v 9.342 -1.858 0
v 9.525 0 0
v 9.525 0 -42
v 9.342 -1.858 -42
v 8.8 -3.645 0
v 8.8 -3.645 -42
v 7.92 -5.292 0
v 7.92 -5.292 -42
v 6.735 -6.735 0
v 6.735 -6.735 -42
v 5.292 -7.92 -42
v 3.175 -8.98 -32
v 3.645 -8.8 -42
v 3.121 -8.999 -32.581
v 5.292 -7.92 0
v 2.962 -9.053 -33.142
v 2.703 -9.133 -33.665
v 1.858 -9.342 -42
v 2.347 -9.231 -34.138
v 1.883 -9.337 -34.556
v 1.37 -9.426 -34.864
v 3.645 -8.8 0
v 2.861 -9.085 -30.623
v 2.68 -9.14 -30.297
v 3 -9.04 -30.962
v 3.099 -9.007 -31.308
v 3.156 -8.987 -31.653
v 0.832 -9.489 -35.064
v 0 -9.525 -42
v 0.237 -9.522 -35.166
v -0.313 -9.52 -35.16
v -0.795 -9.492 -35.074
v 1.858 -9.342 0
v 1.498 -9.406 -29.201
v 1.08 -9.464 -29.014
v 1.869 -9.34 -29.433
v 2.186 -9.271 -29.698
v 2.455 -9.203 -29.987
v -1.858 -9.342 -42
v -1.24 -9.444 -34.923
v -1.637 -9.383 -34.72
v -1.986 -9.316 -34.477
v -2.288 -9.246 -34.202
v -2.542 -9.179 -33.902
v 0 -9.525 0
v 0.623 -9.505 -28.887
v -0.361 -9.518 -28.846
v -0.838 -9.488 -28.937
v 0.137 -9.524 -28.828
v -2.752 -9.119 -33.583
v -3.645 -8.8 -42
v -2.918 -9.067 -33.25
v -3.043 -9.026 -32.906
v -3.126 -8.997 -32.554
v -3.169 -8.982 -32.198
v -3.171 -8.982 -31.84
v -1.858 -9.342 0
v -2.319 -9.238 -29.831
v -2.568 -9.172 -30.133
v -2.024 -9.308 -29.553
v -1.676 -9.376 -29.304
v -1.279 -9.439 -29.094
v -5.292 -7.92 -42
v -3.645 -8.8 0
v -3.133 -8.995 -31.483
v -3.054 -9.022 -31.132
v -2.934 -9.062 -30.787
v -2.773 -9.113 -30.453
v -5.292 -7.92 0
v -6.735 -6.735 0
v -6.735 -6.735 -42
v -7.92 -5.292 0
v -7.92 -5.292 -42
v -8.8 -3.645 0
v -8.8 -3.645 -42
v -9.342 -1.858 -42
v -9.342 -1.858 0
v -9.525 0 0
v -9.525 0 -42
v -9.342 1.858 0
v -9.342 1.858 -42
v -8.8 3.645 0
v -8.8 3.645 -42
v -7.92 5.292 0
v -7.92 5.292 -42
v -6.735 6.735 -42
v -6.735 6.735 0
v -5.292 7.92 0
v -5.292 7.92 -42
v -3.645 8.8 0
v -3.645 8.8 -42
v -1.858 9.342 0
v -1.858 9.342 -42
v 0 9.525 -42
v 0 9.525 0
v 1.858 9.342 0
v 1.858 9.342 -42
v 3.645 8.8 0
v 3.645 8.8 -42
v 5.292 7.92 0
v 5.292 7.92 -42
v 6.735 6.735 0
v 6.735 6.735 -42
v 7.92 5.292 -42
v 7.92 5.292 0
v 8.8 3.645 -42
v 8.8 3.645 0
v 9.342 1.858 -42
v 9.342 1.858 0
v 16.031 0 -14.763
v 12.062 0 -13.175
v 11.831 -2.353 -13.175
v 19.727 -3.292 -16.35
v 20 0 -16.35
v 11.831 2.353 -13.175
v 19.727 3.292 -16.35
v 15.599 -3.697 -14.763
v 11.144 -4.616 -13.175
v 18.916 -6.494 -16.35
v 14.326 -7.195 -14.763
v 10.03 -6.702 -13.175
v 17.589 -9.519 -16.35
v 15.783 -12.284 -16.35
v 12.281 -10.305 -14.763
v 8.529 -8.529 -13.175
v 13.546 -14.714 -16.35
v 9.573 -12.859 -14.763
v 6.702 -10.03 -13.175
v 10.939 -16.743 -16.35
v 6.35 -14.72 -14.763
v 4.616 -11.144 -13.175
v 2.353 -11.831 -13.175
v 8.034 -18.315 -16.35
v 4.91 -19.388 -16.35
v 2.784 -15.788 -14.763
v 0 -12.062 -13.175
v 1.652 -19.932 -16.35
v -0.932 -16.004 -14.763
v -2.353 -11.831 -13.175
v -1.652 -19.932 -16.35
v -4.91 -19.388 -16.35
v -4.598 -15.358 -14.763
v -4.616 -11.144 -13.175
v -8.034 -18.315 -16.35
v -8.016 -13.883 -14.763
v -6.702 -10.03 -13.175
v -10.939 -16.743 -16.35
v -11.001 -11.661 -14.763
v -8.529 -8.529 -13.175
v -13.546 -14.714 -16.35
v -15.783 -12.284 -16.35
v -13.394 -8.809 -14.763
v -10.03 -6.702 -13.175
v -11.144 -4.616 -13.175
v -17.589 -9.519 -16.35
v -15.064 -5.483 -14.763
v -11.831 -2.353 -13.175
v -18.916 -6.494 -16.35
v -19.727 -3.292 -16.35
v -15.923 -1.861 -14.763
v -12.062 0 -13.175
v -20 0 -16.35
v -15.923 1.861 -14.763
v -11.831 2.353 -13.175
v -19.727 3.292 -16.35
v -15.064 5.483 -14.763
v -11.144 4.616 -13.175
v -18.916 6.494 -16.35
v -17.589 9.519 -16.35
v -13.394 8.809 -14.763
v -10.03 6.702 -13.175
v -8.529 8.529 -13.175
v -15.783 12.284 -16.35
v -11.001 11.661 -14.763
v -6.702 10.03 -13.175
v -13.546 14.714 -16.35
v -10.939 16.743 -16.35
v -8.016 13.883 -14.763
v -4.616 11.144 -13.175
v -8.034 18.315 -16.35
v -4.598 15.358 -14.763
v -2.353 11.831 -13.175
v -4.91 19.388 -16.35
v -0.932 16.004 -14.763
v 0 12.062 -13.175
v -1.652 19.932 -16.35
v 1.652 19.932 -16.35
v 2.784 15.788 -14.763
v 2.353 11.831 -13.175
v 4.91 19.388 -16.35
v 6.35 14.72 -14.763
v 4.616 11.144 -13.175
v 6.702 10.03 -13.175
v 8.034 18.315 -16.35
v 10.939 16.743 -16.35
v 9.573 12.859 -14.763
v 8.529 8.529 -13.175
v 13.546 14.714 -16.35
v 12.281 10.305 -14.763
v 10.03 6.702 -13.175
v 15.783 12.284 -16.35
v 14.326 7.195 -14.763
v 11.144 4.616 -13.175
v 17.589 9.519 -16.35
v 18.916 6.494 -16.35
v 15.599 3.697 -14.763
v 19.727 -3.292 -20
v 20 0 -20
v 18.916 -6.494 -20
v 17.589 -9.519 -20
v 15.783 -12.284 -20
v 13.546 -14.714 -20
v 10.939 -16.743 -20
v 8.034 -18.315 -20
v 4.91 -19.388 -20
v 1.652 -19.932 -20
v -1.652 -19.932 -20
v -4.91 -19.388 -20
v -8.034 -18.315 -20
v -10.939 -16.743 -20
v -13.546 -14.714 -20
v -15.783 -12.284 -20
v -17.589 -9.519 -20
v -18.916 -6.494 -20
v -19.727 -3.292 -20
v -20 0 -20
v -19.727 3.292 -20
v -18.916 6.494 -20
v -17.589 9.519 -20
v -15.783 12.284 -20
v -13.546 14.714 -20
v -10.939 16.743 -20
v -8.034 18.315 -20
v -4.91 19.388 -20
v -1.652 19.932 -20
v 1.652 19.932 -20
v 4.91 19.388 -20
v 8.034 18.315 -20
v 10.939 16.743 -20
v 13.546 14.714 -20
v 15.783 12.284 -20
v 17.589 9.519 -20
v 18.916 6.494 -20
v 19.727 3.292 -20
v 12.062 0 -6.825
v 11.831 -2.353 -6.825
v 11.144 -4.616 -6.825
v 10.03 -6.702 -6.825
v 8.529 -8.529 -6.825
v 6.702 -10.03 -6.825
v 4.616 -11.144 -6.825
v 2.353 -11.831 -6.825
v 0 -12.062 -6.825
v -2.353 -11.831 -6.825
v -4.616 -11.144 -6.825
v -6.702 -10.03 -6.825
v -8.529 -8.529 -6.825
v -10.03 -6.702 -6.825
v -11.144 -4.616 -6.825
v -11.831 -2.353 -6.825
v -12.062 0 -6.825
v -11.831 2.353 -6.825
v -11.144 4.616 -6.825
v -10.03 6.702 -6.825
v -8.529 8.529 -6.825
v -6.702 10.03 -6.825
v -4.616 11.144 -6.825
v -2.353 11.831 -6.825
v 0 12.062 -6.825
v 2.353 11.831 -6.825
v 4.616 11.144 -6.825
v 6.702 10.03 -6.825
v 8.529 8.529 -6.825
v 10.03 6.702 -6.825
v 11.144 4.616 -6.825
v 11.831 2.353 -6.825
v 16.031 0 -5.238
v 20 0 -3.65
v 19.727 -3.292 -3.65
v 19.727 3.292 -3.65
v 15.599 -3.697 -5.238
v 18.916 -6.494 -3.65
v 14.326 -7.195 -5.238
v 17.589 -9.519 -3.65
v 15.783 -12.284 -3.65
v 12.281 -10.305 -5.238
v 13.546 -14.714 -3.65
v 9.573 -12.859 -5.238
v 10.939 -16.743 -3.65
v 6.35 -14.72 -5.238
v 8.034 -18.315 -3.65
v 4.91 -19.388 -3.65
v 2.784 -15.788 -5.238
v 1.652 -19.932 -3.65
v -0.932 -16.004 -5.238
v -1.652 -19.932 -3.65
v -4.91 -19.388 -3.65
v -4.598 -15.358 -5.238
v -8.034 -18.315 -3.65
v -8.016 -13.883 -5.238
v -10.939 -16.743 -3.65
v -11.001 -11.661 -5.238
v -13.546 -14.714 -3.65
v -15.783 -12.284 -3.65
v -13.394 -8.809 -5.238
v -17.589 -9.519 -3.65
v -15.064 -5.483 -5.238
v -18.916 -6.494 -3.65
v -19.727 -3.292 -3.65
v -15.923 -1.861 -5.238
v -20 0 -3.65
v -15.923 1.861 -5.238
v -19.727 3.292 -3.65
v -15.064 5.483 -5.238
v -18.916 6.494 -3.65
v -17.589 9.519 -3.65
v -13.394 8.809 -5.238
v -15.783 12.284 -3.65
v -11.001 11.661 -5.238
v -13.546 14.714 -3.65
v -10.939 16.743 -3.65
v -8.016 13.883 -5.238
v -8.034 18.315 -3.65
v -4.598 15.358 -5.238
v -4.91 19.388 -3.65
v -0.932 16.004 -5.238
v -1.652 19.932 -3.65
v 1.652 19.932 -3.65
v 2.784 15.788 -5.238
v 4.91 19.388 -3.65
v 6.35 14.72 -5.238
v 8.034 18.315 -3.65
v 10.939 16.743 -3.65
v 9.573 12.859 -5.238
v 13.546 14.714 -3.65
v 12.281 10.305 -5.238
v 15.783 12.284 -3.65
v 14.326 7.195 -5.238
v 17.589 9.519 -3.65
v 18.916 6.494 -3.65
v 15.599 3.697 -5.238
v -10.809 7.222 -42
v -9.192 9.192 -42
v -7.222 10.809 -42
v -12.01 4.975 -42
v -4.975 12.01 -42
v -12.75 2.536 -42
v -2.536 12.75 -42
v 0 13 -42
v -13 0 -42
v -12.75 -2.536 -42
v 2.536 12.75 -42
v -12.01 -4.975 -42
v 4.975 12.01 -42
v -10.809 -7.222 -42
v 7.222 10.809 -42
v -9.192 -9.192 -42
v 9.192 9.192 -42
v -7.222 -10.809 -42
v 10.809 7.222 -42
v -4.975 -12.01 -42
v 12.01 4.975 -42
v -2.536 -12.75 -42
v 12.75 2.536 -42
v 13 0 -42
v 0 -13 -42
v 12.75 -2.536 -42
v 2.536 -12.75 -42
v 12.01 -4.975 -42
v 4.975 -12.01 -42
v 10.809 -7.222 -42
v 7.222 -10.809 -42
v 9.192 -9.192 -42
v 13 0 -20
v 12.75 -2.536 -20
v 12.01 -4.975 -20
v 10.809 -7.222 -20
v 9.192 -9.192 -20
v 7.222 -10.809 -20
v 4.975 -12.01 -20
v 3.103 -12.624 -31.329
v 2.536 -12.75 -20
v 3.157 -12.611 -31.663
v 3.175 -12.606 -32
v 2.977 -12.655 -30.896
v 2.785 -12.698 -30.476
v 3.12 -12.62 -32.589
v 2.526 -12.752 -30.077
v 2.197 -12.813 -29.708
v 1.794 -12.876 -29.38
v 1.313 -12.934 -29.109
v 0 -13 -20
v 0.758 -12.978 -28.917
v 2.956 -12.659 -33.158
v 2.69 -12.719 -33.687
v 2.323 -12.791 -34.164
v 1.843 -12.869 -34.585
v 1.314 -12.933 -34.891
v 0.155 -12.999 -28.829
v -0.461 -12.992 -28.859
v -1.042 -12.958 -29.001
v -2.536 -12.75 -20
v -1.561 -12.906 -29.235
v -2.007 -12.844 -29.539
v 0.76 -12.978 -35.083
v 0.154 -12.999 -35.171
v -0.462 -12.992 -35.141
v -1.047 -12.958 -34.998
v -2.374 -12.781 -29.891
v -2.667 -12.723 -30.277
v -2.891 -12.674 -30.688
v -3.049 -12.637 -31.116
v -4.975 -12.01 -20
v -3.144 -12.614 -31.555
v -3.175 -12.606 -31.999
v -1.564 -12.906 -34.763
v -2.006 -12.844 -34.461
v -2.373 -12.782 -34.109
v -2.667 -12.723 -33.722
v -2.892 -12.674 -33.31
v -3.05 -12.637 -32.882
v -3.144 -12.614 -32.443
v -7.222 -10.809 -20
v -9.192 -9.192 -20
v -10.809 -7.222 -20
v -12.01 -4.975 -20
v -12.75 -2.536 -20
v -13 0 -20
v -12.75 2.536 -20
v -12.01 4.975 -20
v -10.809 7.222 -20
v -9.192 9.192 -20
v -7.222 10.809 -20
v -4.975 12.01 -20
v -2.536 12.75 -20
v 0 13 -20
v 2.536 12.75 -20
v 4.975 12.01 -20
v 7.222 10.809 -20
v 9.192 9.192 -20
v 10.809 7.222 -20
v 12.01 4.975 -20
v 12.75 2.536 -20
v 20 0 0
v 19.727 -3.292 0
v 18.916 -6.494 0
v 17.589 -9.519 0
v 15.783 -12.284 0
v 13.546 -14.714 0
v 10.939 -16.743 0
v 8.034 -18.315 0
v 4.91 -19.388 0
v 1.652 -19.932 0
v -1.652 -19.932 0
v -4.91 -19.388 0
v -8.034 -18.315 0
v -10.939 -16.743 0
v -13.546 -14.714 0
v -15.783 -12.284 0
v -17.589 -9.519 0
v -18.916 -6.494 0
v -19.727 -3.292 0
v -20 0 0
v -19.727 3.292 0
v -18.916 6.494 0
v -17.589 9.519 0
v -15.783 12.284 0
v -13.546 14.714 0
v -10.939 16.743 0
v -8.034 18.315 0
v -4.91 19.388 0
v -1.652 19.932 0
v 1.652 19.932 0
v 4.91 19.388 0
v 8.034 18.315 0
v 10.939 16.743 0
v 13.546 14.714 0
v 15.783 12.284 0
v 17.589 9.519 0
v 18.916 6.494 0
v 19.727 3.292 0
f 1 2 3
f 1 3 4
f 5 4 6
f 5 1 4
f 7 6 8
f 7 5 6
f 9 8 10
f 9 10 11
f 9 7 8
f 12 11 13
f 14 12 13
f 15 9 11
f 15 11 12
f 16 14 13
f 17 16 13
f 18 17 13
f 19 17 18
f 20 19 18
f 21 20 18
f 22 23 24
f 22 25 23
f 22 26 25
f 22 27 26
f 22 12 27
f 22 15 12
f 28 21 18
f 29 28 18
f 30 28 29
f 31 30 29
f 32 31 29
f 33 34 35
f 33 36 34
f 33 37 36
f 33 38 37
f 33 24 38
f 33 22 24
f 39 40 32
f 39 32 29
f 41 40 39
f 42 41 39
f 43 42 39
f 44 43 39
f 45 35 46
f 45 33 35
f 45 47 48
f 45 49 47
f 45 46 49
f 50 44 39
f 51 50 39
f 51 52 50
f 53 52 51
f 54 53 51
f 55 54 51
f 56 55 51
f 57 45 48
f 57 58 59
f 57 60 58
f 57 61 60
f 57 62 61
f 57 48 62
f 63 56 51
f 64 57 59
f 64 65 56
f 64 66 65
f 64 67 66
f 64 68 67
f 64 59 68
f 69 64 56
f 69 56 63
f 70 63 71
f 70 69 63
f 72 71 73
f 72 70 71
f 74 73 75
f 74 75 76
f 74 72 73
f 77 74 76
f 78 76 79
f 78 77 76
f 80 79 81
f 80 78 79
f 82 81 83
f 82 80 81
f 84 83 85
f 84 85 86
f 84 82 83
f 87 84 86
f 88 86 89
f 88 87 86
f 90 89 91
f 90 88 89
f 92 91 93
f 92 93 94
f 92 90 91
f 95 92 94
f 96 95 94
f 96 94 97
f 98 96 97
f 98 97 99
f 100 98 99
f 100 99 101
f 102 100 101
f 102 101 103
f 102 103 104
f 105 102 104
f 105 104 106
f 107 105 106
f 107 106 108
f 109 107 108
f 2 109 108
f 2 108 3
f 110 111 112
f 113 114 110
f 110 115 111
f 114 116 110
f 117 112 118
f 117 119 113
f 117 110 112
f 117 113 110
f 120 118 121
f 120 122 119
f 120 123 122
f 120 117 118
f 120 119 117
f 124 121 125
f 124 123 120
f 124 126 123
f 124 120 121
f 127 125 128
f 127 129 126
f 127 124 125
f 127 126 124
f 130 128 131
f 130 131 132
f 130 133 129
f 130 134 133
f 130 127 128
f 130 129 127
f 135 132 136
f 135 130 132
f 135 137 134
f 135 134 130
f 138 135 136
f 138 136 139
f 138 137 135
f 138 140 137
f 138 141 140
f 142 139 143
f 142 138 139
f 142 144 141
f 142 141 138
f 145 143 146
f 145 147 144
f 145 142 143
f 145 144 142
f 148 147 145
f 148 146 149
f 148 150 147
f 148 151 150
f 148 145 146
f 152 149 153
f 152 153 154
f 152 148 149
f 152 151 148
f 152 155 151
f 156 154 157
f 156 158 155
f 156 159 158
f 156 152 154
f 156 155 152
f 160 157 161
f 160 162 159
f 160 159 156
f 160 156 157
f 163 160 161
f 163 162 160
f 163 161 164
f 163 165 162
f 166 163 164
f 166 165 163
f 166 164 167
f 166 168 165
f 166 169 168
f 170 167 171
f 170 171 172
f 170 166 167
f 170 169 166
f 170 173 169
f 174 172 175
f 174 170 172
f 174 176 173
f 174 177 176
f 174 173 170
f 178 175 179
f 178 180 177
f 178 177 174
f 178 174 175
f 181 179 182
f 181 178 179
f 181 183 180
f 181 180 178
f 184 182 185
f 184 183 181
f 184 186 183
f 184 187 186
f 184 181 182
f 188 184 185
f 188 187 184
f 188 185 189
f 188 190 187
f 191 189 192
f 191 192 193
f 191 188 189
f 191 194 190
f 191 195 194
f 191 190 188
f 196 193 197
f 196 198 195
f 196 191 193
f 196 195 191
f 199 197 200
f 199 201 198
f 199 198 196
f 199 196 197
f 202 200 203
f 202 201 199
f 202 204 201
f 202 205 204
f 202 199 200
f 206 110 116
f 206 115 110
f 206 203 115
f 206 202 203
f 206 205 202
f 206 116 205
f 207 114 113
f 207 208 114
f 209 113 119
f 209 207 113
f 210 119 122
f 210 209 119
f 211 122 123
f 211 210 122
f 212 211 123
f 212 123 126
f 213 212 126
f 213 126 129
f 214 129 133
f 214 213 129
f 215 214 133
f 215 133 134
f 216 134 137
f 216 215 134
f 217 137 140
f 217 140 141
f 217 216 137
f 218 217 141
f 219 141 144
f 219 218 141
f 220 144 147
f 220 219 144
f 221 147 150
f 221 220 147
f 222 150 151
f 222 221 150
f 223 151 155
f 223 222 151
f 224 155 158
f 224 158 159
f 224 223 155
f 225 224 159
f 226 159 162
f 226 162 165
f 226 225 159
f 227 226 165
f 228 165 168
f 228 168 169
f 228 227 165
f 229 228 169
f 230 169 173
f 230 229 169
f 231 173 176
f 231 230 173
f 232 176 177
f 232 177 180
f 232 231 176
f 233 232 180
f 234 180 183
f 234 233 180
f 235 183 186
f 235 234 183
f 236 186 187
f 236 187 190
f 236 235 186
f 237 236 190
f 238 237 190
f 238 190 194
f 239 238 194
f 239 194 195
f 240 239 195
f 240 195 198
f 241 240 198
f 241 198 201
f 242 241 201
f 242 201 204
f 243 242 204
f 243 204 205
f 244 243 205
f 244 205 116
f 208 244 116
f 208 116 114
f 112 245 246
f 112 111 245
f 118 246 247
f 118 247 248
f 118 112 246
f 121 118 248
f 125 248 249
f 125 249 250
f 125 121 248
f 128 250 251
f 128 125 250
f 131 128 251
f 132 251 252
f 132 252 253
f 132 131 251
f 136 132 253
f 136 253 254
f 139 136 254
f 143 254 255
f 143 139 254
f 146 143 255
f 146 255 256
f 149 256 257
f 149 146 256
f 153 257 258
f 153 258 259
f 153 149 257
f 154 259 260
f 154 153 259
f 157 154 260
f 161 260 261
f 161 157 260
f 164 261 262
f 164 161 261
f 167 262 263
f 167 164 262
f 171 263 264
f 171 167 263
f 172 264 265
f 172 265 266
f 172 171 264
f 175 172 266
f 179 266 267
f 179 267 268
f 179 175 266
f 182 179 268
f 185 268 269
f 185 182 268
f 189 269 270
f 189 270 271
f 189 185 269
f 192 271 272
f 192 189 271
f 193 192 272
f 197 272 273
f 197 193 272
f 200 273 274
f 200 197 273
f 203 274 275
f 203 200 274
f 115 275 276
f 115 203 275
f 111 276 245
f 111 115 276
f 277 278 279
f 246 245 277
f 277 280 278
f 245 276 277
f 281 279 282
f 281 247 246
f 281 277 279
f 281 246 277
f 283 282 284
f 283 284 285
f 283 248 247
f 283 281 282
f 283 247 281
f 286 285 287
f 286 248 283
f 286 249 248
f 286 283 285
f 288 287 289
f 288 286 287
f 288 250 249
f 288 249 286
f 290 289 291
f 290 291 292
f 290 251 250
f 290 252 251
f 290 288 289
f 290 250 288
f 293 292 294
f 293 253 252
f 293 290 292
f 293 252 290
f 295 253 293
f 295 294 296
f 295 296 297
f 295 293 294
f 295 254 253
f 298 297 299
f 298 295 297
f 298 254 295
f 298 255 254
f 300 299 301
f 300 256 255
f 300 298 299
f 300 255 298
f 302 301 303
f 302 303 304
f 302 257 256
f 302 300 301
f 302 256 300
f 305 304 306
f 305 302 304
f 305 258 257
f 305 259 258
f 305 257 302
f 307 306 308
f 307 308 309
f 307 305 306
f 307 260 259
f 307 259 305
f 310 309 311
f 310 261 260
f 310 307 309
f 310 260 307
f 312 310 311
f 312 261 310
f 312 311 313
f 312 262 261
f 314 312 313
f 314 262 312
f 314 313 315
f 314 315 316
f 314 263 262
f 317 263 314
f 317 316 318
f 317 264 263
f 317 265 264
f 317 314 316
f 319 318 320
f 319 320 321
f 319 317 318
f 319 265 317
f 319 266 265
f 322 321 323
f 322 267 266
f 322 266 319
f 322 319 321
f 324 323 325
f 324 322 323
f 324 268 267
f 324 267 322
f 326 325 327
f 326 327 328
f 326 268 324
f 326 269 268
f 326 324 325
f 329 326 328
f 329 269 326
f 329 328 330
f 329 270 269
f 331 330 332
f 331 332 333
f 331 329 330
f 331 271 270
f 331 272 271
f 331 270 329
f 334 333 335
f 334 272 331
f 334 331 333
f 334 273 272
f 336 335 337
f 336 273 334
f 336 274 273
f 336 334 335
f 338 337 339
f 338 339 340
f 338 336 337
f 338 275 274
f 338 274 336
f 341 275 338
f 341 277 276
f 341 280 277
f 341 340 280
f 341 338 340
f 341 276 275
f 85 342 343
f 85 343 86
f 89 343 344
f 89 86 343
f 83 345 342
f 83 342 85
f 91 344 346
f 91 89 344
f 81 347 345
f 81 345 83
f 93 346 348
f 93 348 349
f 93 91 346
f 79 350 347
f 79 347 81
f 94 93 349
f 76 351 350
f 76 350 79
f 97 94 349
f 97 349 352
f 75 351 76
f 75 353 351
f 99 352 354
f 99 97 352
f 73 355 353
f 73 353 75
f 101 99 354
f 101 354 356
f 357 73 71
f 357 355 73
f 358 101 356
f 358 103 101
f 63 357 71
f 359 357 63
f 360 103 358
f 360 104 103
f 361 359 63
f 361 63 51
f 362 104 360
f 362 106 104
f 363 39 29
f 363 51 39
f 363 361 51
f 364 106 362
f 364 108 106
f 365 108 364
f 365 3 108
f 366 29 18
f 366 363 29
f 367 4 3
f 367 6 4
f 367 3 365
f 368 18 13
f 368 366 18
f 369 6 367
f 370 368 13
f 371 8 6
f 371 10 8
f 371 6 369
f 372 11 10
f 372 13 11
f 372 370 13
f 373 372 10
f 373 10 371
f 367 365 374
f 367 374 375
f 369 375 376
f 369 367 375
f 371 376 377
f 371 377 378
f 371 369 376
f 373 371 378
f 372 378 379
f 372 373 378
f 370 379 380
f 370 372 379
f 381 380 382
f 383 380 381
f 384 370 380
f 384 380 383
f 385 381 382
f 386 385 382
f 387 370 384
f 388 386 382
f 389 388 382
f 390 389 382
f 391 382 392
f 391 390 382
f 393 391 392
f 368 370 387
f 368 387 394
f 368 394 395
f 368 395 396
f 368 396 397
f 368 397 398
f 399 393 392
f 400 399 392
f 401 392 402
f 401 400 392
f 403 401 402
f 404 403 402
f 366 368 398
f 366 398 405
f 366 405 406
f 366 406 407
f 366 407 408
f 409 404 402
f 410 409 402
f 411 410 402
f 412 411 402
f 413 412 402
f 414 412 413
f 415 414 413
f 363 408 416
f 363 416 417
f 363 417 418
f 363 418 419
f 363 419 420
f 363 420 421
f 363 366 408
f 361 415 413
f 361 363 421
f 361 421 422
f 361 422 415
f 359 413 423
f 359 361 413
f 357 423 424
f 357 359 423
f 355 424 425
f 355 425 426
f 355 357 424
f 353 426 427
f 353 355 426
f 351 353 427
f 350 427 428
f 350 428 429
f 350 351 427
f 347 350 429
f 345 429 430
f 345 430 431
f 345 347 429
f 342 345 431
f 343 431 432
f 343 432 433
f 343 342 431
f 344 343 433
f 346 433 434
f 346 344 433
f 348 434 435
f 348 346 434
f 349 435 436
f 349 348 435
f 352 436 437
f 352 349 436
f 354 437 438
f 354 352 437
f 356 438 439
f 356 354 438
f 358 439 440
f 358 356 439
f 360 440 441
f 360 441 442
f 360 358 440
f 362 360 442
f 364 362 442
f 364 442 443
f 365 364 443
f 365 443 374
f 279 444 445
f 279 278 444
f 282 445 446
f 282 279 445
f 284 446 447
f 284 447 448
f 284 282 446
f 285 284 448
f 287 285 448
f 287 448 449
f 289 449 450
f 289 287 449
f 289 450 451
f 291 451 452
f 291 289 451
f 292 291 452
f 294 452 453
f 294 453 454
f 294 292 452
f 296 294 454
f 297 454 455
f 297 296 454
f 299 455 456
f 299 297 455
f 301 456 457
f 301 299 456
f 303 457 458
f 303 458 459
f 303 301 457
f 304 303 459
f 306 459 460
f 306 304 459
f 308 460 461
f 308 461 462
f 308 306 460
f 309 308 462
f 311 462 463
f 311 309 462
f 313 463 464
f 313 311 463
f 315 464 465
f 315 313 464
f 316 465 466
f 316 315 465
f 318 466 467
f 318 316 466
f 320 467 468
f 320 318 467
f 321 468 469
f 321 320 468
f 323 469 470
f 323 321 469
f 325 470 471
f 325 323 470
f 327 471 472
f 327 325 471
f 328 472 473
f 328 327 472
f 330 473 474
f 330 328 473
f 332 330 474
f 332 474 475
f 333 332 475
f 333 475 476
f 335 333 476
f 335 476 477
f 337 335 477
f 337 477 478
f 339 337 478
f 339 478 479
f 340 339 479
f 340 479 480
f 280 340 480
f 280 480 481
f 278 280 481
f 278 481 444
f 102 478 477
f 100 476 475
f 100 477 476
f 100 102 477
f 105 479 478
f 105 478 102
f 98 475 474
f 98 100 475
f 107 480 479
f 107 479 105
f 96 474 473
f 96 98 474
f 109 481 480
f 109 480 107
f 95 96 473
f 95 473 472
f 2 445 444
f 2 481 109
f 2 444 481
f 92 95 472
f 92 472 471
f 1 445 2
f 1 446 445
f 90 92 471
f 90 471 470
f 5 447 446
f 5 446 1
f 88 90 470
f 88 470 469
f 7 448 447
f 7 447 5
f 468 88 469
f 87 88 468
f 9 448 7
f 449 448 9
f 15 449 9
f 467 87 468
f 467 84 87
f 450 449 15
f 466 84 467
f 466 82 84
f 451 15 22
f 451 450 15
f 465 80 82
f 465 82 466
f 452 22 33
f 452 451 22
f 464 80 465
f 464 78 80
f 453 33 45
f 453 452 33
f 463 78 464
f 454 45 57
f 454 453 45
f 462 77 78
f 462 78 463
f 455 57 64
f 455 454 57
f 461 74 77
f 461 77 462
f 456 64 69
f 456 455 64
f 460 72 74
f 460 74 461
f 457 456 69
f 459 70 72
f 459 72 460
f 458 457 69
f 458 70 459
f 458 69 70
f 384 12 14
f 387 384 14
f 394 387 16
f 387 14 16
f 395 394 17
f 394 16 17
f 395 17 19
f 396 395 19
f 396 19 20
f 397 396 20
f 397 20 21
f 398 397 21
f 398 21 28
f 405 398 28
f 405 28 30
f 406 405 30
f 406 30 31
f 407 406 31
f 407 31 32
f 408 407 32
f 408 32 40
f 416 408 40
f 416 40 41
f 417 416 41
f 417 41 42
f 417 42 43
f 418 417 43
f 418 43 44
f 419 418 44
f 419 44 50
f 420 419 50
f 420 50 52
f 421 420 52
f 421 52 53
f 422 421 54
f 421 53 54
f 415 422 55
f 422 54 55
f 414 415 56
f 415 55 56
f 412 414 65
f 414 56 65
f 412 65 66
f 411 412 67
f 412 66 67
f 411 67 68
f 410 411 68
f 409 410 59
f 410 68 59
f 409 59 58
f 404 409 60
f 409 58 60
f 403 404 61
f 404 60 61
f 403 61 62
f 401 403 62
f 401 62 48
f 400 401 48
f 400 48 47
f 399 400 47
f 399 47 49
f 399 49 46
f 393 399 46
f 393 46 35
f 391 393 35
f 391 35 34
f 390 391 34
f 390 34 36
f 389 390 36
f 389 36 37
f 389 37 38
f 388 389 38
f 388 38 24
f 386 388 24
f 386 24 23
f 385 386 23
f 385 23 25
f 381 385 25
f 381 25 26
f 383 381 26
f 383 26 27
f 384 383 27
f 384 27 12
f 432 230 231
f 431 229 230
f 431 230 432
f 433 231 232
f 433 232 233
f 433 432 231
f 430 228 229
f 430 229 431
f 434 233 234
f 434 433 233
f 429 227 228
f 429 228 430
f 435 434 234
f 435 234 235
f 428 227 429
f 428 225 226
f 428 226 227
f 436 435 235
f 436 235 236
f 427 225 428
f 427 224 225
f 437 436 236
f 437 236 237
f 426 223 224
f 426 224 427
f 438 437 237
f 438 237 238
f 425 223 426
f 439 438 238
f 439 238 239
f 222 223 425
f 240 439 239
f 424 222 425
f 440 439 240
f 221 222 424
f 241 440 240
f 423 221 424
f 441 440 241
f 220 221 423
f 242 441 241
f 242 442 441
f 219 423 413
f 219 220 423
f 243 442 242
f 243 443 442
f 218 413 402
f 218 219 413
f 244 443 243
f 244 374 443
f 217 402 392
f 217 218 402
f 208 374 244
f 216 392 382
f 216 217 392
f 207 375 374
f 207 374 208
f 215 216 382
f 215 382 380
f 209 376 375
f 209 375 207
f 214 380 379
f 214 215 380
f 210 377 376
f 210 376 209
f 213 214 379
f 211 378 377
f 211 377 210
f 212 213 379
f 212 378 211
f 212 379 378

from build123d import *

# Parameters (mm, degrees)
CROQUIS7_R            = 3.175
CORTAR_EXTRUIR2_DEPTH = 21


with BuildPart() as part:
    # Croquis2 → Revolución2 (revolve)
    with BuildSketch(Plane(origin=(0, 0, 0), x_dir=(1, 0, 0), z_dir=(0, 1, 0))):
        Polygon((20, 0), (20, 3.65), (12.0625, 6.825), (12.0625, 13.175), (20, 16.35), (20, 20), (13, 20), (13, 42), (9.525, 42), (9.525, 0), align=None)
    revolve(axis=Axis((0, 0, 0), (0, 0, -1)))

    # Croquis7 → Cortar-Extruir2 (cut, through all)
    with BuildSketch(Plane(origin=(0, 0, 0), x_dir=(1, 0, 0), z_dir=(0, 1, 0))):
        with Locations((0, 32)):
            Circle(CROQUIS7_R)
    extrude(amount=-CORTAR_EXTRUIR2_DEPTH, mode=Mode.SUBTRACT)


solid = part.part
